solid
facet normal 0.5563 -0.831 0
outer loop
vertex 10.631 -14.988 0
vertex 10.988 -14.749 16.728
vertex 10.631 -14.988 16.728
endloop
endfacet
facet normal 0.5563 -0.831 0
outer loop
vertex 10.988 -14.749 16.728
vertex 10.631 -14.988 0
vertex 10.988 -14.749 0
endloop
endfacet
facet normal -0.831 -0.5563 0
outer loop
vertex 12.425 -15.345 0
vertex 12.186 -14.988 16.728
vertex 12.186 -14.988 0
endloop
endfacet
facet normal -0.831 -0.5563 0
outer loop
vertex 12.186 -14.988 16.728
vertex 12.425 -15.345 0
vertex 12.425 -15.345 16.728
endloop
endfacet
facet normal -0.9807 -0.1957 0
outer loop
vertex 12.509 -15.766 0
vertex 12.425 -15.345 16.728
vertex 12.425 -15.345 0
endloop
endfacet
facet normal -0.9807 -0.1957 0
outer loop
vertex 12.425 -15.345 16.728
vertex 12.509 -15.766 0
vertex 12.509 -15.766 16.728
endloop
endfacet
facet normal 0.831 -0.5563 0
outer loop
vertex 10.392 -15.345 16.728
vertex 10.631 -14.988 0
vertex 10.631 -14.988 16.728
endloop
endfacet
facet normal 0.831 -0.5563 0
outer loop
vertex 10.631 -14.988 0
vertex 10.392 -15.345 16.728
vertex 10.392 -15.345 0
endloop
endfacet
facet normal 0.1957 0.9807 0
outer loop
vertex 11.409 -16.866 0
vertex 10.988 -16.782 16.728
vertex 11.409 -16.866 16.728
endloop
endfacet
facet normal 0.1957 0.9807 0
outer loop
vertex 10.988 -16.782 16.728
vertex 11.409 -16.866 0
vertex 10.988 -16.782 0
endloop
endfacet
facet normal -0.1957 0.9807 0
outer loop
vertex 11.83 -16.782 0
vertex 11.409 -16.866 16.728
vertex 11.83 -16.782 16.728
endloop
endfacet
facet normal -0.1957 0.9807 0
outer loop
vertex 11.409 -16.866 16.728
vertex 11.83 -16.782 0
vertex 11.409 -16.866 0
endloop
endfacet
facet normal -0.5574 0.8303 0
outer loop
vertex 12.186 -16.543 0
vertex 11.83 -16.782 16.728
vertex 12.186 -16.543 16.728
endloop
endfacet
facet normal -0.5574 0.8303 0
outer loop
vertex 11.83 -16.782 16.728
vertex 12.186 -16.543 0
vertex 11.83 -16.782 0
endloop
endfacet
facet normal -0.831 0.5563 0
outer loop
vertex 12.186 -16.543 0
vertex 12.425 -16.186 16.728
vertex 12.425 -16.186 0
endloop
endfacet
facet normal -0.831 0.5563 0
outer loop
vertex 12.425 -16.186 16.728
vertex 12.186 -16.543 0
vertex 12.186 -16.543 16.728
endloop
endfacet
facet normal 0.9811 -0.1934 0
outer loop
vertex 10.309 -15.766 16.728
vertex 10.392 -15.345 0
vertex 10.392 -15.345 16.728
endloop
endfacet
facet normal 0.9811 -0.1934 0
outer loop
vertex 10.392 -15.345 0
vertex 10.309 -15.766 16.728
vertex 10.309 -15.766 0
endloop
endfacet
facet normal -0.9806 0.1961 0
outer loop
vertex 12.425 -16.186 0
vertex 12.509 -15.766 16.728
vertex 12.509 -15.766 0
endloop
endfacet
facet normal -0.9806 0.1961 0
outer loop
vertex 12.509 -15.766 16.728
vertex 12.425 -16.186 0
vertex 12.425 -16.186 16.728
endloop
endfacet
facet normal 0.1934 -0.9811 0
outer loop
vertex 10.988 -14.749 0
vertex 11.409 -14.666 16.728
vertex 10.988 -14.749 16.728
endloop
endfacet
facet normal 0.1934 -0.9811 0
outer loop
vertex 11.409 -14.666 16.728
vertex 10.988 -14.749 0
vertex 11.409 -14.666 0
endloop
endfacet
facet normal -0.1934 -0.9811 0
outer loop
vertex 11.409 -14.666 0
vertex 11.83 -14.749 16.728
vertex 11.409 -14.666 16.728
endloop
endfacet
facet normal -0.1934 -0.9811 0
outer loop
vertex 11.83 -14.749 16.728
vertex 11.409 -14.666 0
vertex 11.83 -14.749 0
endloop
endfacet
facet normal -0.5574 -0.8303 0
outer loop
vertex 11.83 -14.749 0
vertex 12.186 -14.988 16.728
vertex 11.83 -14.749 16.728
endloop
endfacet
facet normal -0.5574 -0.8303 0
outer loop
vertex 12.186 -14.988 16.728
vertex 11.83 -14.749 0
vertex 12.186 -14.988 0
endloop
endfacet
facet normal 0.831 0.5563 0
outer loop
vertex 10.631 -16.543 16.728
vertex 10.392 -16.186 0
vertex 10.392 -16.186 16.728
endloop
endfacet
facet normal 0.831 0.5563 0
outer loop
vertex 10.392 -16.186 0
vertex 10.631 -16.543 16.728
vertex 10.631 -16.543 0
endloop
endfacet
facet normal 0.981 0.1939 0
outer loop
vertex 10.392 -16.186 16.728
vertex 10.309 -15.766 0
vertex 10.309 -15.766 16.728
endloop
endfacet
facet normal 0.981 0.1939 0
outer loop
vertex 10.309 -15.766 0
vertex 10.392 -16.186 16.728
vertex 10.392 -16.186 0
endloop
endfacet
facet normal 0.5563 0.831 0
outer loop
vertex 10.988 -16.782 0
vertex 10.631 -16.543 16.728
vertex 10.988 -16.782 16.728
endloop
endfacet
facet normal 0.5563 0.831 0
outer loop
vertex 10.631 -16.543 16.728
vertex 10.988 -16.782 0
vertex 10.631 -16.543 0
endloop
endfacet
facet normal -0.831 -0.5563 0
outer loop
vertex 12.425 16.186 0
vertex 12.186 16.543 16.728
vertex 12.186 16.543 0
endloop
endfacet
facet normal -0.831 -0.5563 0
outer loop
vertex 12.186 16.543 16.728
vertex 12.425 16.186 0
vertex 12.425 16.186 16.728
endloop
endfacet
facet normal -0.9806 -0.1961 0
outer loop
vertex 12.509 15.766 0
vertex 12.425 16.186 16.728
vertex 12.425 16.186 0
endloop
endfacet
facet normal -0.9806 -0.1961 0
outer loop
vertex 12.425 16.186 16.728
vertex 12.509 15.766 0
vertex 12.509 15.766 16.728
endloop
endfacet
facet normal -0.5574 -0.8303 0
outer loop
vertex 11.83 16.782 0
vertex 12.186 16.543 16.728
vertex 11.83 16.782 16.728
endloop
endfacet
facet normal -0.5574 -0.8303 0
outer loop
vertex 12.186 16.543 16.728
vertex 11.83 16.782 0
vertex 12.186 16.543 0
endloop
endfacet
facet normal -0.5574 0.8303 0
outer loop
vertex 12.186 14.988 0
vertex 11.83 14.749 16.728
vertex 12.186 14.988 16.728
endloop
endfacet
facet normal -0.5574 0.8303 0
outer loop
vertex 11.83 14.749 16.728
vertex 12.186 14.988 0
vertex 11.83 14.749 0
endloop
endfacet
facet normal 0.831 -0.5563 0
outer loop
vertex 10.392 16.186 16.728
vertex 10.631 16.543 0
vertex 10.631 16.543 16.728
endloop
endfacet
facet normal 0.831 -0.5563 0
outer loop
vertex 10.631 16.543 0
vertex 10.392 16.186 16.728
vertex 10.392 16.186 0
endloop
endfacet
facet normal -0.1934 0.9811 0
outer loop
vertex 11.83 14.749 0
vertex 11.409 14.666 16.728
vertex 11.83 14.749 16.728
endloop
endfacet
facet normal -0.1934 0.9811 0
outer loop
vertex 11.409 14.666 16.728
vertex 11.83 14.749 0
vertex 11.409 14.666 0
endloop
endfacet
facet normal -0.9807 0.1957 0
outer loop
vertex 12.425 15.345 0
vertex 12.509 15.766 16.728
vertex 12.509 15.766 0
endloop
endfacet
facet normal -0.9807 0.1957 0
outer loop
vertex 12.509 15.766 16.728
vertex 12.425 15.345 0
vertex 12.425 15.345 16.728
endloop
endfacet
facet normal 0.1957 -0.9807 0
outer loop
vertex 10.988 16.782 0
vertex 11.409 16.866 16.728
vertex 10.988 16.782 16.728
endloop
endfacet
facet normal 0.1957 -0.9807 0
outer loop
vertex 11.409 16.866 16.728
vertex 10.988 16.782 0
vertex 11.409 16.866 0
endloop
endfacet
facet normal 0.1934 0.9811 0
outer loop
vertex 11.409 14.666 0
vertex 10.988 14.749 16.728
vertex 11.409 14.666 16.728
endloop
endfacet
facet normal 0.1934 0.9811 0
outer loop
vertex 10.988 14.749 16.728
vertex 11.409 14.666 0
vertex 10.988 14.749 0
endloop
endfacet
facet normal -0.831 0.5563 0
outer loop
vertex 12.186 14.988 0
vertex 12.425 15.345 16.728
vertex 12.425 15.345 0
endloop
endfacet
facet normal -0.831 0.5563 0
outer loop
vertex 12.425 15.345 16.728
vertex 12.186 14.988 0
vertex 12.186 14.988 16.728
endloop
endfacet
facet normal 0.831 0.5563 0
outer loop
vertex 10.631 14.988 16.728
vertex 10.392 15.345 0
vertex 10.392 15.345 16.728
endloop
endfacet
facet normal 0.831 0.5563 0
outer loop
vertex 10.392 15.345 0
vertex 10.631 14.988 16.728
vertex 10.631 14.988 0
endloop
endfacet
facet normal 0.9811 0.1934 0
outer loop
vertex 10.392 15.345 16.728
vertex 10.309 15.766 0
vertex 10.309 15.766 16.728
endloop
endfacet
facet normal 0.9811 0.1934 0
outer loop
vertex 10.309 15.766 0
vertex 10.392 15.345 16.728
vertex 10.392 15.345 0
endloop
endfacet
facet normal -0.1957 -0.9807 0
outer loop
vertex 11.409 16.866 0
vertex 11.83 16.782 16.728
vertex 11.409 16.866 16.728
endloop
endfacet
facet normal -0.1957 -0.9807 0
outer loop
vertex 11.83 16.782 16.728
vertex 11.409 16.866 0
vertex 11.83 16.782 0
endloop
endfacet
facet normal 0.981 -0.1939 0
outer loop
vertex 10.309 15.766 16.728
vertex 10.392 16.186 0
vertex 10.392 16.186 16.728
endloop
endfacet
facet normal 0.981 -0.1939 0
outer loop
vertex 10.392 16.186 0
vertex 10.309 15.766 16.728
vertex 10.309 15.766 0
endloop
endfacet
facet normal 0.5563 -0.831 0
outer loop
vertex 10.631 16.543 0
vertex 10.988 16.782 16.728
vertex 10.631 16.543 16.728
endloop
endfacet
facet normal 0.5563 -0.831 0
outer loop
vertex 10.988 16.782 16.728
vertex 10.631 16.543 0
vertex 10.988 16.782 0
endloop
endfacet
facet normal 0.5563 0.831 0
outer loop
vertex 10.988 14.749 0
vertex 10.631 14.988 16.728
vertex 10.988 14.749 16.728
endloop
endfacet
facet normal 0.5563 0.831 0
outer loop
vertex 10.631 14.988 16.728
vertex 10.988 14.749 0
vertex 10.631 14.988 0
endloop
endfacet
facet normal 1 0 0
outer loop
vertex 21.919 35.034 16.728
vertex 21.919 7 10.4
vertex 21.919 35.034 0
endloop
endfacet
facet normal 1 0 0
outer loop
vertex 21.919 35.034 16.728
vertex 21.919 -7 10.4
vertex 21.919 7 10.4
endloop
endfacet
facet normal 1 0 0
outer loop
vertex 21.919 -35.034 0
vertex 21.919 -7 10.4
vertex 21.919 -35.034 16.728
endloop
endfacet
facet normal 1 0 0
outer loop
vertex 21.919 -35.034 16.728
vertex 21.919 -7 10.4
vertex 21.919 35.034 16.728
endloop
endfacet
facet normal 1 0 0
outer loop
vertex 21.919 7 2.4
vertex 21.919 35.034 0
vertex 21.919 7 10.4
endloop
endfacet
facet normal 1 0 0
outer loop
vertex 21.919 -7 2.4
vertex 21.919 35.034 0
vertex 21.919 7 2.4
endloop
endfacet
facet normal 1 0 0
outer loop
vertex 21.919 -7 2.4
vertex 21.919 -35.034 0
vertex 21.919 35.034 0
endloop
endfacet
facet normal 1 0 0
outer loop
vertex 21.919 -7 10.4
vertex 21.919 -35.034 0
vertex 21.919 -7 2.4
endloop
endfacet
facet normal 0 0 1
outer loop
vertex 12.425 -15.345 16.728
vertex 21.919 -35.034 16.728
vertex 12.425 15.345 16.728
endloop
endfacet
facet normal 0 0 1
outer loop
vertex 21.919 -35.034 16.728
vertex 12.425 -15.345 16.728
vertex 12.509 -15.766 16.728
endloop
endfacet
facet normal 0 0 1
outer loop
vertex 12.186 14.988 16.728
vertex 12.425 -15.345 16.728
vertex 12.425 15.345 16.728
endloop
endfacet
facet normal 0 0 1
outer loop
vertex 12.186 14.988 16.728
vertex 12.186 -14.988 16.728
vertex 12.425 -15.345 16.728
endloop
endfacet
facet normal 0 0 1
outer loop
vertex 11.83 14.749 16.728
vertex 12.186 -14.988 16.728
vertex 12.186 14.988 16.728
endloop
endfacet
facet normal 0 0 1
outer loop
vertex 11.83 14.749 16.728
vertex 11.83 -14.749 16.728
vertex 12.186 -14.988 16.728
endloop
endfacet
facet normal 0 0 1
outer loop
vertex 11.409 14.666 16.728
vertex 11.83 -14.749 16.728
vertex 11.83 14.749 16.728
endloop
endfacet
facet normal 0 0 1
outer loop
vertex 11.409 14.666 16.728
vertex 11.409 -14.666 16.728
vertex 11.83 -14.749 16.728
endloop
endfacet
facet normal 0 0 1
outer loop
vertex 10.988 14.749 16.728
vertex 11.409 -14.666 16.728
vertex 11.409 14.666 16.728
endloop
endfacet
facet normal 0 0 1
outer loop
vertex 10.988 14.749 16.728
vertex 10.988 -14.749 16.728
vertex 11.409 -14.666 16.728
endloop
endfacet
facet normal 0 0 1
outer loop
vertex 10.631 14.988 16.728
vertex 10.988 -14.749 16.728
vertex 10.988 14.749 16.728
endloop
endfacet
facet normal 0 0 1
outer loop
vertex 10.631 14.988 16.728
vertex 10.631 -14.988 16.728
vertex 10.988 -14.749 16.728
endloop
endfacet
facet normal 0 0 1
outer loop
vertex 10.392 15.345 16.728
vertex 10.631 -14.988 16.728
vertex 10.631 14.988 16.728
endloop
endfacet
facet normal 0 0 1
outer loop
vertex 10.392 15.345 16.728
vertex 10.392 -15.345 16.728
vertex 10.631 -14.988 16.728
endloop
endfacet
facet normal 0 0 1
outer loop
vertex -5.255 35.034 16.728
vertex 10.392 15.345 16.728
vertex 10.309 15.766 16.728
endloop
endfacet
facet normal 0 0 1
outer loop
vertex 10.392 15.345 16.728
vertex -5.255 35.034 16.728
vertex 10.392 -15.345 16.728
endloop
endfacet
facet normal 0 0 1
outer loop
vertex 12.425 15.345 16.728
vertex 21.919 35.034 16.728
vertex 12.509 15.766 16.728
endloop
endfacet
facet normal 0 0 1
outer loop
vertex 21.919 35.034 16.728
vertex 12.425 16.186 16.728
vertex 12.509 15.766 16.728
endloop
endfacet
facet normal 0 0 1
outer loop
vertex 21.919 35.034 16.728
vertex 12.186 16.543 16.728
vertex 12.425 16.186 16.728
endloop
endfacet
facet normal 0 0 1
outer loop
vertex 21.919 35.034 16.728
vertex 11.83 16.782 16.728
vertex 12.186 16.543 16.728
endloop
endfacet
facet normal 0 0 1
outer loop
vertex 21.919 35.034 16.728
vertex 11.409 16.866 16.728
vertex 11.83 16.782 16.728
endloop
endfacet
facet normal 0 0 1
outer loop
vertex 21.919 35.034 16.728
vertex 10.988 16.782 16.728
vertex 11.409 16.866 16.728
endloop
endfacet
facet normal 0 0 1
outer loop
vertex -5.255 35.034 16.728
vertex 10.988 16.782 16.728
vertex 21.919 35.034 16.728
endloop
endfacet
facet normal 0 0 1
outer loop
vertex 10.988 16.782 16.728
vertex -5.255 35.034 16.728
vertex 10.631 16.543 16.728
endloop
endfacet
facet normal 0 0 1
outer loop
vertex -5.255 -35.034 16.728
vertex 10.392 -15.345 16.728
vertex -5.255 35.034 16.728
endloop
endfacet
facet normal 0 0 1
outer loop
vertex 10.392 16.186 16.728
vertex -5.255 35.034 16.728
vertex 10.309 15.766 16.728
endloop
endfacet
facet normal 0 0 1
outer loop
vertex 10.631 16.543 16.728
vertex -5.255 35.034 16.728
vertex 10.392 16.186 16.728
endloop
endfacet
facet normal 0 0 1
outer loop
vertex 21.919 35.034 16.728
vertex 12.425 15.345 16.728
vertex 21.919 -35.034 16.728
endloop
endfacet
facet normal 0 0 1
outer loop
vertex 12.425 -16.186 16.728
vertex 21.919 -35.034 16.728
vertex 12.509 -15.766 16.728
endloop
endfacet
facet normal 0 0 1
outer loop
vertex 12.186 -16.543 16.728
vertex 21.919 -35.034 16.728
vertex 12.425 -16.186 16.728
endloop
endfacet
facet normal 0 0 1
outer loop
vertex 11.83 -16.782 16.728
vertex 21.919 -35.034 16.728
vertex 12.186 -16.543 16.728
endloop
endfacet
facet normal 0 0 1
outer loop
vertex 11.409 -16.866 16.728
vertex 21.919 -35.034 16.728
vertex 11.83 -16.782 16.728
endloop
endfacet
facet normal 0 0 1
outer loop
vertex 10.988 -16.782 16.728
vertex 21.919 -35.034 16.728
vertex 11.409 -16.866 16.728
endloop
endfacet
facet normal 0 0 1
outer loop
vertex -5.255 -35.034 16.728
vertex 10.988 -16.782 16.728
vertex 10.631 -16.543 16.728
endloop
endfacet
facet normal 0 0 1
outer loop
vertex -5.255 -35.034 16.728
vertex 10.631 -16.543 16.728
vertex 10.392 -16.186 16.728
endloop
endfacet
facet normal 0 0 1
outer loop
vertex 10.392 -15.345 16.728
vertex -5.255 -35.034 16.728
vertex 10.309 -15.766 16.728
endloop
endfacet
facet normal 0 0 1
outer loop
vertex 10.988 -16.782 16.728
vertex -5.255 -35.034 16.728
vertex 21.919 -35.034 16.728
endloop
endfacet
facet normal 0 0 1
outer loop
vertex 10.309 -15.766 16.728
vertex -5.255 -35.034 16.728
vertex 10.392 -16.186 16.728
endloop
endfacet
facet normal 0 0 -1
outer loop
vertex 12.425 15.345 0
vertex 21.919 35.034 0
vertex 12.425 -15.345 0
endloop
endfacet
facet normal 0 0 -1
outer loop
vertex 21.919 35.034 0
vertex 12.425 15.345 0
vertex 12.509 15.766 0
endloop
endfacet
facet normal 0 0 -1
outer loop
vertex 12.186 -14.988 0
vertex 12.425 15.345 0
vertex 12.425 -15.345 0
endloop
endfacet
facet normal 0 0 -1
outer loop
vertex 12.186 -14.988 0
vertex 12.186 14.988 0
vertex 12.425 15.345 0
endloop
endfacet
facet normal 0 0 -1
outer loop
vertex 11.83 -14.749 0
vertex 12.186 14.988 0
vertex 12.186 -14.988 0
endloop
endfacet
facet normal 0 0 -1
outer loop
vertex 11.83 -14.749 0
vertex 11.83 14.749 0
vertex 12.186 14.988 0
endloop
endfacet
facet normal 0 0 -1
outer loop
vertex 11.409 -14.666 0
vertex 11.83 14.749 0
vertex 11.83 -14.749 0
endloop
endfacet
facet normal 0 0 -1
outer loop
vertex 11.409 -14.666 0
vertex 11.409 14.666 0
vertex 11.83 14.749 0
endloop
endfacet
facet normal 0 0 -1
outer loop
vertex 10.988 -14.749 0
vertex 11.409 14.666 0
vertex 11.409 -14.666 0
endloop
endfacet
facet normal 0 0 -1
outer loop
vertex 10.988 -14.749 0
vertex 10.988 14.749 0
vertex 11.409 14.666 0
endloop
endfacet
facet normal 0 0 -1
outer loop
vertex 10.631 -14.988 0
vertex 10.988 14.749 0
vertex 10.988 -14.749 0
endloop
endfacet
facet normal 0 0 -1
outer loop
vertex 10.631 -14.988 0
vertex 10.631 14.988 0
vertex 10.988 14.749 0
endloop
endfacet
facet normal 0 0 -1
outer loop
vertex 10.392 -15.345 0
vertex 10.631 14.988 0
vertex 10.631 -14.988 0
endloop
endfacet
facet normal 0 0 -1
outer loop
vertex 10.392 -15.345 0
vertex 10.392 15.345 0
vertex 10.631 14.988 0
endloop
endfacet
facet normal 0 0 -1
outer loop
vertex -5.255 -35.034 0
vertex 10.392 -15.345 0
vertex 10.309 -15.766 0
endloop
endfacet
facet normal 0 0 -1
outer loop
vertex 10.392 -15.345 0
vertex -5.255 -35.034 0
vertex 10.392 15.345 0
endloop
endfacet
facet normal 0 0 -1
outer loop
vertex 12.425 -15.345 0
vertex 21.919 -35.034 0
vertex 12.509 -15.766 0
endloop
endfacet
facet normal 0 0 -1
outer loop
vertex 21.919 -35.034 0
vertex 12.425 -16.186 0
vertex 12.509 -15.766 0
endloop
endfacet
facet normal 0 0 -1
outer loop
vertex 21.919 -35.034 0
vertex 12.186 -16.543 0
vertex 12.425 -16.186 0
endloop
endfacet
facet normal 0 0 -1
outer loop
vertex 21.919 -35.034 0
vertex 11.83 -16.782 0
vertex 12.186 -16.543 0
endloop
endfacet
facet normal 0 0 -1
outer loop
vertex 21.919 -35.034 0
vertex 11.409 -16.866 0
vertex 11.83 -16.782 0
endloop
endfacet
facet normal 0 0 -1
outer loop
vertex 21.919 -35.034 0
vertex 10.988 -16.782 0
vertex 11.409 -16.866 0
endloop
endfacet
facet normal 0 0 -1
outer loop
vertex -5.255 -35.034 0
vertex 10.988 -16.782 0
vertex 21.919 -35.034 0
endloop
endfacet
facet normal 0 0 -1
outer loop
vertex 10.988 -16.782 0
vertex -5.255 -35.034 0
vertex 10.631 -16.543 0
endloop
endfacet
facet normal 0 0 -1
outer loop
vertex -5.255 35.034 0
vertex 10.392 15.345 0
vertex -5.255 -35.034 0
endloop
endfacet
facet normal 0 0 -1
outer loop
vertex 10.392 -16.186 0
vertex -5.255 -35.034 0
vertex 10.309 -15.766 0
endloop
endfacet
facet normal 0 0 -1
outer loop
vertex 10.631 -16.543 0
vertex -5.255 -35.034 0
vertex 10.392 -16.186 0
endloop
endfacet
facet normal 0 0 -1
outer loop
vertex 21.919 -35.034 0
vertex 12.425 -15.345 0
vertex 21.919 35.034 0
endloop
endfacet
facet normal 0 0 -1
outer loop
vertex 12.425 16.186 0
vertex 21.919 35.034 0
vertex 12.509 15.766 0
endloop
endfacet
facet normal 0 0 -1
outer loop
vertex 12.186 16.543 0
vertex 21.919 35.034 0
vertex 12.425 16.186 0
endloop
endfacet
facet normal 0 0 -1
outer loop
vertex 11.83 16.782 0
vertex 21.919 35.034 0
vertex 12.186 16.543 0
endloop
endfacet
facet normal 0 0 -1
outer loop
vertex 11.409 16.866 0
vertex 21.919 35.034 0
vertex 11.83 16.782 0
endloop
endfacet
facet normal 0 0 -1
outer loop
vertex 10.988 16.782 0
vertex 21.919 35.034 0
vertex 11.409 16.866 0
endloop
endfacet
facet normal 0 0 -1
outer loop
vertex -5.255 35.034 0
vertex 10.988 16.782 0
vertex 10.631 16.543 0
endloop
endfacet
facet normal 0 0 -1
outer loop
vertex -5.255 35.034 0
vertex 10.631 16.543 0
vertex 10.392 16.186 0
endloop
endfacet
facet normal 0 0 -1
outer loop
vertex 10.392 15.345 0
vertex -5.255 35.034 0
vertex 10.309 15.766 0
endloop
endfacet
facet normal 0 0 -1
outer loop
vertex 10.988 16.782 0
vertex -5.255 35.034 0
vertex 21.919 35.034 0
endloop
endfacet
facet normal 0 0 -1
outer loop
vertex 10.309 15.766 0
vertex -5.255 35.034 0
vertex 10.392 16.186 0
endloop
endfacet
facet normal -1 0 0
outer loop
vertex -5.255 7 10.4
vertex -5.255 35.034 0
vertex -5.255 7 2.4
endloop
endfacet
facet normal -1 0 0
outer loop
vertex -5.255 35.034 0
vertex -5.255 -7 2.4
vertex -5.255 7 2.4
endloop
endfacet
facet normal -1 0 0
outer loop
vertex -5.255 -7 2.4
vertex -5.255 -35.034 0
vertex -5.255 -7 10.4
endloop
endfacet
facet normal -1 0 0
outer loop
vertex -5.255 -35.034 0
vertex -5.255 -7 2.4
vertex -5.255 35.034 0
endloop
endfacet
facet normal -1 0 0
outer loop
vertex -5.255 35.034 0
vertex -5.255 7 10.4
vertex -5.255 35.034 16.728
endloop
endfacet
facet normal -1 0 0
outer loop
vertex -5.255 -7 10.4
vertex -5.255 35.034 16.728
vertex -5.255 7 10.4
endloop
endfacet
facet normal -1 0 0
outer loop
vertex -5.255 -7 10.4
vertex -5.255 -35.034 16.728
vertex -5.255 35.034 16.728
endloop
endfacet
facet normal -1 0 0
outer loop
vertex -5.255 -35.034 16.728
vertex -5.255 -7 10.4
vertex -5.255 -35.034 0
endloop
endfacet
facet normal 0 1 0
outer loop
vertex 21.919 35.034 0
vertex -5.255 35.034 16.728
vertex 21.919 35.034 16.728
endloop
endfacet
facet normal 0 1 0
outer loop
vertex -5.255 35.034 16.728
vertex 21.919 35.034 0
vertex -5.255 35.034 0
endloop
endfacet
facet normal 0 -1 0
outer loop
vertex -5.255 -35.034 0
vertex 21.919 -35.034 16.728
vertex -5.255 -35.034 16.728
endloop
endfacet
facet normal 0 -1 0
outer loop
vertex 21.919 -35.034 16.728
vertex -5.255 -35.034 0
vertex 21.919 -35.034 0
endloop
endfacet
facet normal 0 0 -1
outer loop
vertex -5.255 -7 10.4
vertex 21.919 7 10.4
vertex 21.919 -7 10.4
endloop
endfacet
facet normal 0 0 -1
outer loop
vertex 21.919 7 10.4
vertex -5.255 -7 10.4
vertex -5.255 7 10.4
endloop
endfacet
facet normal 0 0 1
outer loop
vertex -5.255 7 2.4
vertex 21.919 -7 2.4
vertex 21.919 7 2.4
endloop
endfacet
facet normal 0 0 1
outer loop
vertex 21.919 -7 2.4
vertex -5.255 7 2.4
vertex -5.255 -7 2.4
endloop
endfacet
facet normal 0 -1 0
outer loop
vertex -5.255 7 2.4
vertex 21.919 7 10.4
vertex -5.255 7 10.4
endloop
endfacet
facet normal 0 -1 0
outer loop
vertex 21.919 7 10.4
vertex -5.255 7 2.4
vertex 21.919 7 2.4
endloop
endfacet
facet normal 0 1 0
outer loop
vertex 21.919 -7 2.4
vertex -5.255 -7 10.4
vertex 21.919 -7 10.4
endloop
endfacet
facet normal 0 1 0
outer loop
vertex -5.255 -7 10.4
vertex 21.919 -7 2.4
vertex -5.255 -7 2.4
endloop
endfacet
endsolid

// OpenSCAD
// file: ../../library/e7_all.scad
// ==========================================================================
//  e7_all.scad - include this one file. Preview, print plates and the report.
// ==========================================================================
include <e7_params.scad>
include <e7_body.scad>

// whole painted loco
module e7_preview() {
  // carbody in its paint bands
  for (i = [0:len(PAINT_BANDS) - 1]) {
    z0 = i == 0 ? -1 : p(PAINT_BANDS[i - 1][0]);
    z1 = i == len(PAINT_BANDS) - 1 ? 1000 : p(PAINT_BANDS[i][0]);
    color(PAINT_BANDS[i][1]) render(convexity = 8) e7_shell_solid([z0, z1]);
  }
  color(C_GLASS) e7_glass();
  color(C_LENS) let (d = nose_d_at_z(HEADLIGHT[0]))
    translate([XF - p(d) + p(HEADLIGHT[2]) + p(1.5), 0, p(HEADLIGHT[0])]) rotate([0, 90, 0]) cylinder(d = p(HEADLIGHT[1]) - 0.8, h = 0.5, $fn = 32);
  color(C_FRAME) { for (j = [1:NFRAME]) e7_frame_piece(j); e7_pilot(); e7_pilot_rear(); }
  for (tx = [TRK_X, -TRK_X]) translate([tx, 0, 0]) { color(C_TRUCK) e7_truck_frame(); color(C_WHEEL) e7_wheels(); }
}
// thin glass panes sitting in the window pockets (preview only)
module e7_glass() {
  intersection() { e7_loft(DET * 0.6); union() { e7_windshield_cut(); e7_side_cuts_windows_only(); } }
}
module e7_side_cuts_windows_only() {
  for (s = [-1, 1], w = CAB_WIN)
    translate([XF - p(w[1]), s * HW - (s > 0 ? DET : 3 - DET), p(w[2])]) cube([p(w[1] - w[0]), 3, p(w[3] - w[2])]);
}

// one print, laid out for the printer
module e7_plate(part) {
  sec = [for (k = [1:NSEC]) str("body_", k)];
  frm = [for (j = [1:NFRAME]) str("frame_", j)];
  if (is_num(search([part], sec)[0])) {
    k = search([part], sec)[0] + 1;
    // stand the section on its open bottom (skirt edge on the bed)
    translate([-sec_x0(k) - SEC_L / 2, 0, -Z_SKIRT]) e7_body_section(k);
  } else if (is_num(search([part], frm)[0])) {
    j = search([part], frm)[0] + 1;
    xs = concat([FRAME_X0], FRAME_SPLITS, [FRAME_X1]);
    translate([-(xs[j - 1] + xs[j]) / 2, 0, -Z_FRAME_BOT]) e7_frame_piece(j);
  } else if (part == "pilot") {
    translate([-XF, 0, 0]) rotate([0, 0, 0]) translate([0, 0, -p(5)]) e7_pilot();
  } else if (part == "pilot_rear") {
    translate([-XR, 0, 0]) translate([0, 0, -(CPL_Z - CPL_H / 2 - WALL)]) e7_pilot_rear();
  } else if (part == "truck") {
    // upside down, bolster on the bed
    translate([0, 0, Z_FRAME_BOT - 0.3]) rotate([180, 0, 0]) e7_truck_frame();
  } else {
    assert(false, str("unknown part '", part, "'"));
  }
}

module e7_report() {
  echo(str("MILW E7A ", ROAD_NO, " class ", CLASS, " - ", SC, " scale 1:", RATIO, ", paint ", PAINT));
  echo(str("  carbody ", round(BL), " mm long, ", round(2 * HW), " mm wide, roof ", round(Z_ROOF), " mm, cab ", round(Z_CAB), " mm above rail"));
  echo(str("  ", NSEC, " body sections of ", round(SEC_L), " mm; ", NFRAME, " frame pieces; trucks at +/- ", round(TRK_X), " mm"));
  echo(str("  body screws ", SCREW_BODY_NAME, " x ", 2 * len(BOSS_X), "; truck pivots ", PIVOT[1], "; wheels ", round(WHEEL_D * 10) / 10, " mm (bought)"));
}
// main file
// Milwaukee Road E7A, G scale 1-29 - print 11 of 12: pilot_rear - rear coupler pocket block
// Render (F6), export STL, print. Settings: ../../library/e7_params.scad
// Whole loco preview and notes: ../../MILW_E7_Main.scad
SCALE_SEL = "G";
include <../../library/e7_all.scad>
e7_plate("pilot_rear");
